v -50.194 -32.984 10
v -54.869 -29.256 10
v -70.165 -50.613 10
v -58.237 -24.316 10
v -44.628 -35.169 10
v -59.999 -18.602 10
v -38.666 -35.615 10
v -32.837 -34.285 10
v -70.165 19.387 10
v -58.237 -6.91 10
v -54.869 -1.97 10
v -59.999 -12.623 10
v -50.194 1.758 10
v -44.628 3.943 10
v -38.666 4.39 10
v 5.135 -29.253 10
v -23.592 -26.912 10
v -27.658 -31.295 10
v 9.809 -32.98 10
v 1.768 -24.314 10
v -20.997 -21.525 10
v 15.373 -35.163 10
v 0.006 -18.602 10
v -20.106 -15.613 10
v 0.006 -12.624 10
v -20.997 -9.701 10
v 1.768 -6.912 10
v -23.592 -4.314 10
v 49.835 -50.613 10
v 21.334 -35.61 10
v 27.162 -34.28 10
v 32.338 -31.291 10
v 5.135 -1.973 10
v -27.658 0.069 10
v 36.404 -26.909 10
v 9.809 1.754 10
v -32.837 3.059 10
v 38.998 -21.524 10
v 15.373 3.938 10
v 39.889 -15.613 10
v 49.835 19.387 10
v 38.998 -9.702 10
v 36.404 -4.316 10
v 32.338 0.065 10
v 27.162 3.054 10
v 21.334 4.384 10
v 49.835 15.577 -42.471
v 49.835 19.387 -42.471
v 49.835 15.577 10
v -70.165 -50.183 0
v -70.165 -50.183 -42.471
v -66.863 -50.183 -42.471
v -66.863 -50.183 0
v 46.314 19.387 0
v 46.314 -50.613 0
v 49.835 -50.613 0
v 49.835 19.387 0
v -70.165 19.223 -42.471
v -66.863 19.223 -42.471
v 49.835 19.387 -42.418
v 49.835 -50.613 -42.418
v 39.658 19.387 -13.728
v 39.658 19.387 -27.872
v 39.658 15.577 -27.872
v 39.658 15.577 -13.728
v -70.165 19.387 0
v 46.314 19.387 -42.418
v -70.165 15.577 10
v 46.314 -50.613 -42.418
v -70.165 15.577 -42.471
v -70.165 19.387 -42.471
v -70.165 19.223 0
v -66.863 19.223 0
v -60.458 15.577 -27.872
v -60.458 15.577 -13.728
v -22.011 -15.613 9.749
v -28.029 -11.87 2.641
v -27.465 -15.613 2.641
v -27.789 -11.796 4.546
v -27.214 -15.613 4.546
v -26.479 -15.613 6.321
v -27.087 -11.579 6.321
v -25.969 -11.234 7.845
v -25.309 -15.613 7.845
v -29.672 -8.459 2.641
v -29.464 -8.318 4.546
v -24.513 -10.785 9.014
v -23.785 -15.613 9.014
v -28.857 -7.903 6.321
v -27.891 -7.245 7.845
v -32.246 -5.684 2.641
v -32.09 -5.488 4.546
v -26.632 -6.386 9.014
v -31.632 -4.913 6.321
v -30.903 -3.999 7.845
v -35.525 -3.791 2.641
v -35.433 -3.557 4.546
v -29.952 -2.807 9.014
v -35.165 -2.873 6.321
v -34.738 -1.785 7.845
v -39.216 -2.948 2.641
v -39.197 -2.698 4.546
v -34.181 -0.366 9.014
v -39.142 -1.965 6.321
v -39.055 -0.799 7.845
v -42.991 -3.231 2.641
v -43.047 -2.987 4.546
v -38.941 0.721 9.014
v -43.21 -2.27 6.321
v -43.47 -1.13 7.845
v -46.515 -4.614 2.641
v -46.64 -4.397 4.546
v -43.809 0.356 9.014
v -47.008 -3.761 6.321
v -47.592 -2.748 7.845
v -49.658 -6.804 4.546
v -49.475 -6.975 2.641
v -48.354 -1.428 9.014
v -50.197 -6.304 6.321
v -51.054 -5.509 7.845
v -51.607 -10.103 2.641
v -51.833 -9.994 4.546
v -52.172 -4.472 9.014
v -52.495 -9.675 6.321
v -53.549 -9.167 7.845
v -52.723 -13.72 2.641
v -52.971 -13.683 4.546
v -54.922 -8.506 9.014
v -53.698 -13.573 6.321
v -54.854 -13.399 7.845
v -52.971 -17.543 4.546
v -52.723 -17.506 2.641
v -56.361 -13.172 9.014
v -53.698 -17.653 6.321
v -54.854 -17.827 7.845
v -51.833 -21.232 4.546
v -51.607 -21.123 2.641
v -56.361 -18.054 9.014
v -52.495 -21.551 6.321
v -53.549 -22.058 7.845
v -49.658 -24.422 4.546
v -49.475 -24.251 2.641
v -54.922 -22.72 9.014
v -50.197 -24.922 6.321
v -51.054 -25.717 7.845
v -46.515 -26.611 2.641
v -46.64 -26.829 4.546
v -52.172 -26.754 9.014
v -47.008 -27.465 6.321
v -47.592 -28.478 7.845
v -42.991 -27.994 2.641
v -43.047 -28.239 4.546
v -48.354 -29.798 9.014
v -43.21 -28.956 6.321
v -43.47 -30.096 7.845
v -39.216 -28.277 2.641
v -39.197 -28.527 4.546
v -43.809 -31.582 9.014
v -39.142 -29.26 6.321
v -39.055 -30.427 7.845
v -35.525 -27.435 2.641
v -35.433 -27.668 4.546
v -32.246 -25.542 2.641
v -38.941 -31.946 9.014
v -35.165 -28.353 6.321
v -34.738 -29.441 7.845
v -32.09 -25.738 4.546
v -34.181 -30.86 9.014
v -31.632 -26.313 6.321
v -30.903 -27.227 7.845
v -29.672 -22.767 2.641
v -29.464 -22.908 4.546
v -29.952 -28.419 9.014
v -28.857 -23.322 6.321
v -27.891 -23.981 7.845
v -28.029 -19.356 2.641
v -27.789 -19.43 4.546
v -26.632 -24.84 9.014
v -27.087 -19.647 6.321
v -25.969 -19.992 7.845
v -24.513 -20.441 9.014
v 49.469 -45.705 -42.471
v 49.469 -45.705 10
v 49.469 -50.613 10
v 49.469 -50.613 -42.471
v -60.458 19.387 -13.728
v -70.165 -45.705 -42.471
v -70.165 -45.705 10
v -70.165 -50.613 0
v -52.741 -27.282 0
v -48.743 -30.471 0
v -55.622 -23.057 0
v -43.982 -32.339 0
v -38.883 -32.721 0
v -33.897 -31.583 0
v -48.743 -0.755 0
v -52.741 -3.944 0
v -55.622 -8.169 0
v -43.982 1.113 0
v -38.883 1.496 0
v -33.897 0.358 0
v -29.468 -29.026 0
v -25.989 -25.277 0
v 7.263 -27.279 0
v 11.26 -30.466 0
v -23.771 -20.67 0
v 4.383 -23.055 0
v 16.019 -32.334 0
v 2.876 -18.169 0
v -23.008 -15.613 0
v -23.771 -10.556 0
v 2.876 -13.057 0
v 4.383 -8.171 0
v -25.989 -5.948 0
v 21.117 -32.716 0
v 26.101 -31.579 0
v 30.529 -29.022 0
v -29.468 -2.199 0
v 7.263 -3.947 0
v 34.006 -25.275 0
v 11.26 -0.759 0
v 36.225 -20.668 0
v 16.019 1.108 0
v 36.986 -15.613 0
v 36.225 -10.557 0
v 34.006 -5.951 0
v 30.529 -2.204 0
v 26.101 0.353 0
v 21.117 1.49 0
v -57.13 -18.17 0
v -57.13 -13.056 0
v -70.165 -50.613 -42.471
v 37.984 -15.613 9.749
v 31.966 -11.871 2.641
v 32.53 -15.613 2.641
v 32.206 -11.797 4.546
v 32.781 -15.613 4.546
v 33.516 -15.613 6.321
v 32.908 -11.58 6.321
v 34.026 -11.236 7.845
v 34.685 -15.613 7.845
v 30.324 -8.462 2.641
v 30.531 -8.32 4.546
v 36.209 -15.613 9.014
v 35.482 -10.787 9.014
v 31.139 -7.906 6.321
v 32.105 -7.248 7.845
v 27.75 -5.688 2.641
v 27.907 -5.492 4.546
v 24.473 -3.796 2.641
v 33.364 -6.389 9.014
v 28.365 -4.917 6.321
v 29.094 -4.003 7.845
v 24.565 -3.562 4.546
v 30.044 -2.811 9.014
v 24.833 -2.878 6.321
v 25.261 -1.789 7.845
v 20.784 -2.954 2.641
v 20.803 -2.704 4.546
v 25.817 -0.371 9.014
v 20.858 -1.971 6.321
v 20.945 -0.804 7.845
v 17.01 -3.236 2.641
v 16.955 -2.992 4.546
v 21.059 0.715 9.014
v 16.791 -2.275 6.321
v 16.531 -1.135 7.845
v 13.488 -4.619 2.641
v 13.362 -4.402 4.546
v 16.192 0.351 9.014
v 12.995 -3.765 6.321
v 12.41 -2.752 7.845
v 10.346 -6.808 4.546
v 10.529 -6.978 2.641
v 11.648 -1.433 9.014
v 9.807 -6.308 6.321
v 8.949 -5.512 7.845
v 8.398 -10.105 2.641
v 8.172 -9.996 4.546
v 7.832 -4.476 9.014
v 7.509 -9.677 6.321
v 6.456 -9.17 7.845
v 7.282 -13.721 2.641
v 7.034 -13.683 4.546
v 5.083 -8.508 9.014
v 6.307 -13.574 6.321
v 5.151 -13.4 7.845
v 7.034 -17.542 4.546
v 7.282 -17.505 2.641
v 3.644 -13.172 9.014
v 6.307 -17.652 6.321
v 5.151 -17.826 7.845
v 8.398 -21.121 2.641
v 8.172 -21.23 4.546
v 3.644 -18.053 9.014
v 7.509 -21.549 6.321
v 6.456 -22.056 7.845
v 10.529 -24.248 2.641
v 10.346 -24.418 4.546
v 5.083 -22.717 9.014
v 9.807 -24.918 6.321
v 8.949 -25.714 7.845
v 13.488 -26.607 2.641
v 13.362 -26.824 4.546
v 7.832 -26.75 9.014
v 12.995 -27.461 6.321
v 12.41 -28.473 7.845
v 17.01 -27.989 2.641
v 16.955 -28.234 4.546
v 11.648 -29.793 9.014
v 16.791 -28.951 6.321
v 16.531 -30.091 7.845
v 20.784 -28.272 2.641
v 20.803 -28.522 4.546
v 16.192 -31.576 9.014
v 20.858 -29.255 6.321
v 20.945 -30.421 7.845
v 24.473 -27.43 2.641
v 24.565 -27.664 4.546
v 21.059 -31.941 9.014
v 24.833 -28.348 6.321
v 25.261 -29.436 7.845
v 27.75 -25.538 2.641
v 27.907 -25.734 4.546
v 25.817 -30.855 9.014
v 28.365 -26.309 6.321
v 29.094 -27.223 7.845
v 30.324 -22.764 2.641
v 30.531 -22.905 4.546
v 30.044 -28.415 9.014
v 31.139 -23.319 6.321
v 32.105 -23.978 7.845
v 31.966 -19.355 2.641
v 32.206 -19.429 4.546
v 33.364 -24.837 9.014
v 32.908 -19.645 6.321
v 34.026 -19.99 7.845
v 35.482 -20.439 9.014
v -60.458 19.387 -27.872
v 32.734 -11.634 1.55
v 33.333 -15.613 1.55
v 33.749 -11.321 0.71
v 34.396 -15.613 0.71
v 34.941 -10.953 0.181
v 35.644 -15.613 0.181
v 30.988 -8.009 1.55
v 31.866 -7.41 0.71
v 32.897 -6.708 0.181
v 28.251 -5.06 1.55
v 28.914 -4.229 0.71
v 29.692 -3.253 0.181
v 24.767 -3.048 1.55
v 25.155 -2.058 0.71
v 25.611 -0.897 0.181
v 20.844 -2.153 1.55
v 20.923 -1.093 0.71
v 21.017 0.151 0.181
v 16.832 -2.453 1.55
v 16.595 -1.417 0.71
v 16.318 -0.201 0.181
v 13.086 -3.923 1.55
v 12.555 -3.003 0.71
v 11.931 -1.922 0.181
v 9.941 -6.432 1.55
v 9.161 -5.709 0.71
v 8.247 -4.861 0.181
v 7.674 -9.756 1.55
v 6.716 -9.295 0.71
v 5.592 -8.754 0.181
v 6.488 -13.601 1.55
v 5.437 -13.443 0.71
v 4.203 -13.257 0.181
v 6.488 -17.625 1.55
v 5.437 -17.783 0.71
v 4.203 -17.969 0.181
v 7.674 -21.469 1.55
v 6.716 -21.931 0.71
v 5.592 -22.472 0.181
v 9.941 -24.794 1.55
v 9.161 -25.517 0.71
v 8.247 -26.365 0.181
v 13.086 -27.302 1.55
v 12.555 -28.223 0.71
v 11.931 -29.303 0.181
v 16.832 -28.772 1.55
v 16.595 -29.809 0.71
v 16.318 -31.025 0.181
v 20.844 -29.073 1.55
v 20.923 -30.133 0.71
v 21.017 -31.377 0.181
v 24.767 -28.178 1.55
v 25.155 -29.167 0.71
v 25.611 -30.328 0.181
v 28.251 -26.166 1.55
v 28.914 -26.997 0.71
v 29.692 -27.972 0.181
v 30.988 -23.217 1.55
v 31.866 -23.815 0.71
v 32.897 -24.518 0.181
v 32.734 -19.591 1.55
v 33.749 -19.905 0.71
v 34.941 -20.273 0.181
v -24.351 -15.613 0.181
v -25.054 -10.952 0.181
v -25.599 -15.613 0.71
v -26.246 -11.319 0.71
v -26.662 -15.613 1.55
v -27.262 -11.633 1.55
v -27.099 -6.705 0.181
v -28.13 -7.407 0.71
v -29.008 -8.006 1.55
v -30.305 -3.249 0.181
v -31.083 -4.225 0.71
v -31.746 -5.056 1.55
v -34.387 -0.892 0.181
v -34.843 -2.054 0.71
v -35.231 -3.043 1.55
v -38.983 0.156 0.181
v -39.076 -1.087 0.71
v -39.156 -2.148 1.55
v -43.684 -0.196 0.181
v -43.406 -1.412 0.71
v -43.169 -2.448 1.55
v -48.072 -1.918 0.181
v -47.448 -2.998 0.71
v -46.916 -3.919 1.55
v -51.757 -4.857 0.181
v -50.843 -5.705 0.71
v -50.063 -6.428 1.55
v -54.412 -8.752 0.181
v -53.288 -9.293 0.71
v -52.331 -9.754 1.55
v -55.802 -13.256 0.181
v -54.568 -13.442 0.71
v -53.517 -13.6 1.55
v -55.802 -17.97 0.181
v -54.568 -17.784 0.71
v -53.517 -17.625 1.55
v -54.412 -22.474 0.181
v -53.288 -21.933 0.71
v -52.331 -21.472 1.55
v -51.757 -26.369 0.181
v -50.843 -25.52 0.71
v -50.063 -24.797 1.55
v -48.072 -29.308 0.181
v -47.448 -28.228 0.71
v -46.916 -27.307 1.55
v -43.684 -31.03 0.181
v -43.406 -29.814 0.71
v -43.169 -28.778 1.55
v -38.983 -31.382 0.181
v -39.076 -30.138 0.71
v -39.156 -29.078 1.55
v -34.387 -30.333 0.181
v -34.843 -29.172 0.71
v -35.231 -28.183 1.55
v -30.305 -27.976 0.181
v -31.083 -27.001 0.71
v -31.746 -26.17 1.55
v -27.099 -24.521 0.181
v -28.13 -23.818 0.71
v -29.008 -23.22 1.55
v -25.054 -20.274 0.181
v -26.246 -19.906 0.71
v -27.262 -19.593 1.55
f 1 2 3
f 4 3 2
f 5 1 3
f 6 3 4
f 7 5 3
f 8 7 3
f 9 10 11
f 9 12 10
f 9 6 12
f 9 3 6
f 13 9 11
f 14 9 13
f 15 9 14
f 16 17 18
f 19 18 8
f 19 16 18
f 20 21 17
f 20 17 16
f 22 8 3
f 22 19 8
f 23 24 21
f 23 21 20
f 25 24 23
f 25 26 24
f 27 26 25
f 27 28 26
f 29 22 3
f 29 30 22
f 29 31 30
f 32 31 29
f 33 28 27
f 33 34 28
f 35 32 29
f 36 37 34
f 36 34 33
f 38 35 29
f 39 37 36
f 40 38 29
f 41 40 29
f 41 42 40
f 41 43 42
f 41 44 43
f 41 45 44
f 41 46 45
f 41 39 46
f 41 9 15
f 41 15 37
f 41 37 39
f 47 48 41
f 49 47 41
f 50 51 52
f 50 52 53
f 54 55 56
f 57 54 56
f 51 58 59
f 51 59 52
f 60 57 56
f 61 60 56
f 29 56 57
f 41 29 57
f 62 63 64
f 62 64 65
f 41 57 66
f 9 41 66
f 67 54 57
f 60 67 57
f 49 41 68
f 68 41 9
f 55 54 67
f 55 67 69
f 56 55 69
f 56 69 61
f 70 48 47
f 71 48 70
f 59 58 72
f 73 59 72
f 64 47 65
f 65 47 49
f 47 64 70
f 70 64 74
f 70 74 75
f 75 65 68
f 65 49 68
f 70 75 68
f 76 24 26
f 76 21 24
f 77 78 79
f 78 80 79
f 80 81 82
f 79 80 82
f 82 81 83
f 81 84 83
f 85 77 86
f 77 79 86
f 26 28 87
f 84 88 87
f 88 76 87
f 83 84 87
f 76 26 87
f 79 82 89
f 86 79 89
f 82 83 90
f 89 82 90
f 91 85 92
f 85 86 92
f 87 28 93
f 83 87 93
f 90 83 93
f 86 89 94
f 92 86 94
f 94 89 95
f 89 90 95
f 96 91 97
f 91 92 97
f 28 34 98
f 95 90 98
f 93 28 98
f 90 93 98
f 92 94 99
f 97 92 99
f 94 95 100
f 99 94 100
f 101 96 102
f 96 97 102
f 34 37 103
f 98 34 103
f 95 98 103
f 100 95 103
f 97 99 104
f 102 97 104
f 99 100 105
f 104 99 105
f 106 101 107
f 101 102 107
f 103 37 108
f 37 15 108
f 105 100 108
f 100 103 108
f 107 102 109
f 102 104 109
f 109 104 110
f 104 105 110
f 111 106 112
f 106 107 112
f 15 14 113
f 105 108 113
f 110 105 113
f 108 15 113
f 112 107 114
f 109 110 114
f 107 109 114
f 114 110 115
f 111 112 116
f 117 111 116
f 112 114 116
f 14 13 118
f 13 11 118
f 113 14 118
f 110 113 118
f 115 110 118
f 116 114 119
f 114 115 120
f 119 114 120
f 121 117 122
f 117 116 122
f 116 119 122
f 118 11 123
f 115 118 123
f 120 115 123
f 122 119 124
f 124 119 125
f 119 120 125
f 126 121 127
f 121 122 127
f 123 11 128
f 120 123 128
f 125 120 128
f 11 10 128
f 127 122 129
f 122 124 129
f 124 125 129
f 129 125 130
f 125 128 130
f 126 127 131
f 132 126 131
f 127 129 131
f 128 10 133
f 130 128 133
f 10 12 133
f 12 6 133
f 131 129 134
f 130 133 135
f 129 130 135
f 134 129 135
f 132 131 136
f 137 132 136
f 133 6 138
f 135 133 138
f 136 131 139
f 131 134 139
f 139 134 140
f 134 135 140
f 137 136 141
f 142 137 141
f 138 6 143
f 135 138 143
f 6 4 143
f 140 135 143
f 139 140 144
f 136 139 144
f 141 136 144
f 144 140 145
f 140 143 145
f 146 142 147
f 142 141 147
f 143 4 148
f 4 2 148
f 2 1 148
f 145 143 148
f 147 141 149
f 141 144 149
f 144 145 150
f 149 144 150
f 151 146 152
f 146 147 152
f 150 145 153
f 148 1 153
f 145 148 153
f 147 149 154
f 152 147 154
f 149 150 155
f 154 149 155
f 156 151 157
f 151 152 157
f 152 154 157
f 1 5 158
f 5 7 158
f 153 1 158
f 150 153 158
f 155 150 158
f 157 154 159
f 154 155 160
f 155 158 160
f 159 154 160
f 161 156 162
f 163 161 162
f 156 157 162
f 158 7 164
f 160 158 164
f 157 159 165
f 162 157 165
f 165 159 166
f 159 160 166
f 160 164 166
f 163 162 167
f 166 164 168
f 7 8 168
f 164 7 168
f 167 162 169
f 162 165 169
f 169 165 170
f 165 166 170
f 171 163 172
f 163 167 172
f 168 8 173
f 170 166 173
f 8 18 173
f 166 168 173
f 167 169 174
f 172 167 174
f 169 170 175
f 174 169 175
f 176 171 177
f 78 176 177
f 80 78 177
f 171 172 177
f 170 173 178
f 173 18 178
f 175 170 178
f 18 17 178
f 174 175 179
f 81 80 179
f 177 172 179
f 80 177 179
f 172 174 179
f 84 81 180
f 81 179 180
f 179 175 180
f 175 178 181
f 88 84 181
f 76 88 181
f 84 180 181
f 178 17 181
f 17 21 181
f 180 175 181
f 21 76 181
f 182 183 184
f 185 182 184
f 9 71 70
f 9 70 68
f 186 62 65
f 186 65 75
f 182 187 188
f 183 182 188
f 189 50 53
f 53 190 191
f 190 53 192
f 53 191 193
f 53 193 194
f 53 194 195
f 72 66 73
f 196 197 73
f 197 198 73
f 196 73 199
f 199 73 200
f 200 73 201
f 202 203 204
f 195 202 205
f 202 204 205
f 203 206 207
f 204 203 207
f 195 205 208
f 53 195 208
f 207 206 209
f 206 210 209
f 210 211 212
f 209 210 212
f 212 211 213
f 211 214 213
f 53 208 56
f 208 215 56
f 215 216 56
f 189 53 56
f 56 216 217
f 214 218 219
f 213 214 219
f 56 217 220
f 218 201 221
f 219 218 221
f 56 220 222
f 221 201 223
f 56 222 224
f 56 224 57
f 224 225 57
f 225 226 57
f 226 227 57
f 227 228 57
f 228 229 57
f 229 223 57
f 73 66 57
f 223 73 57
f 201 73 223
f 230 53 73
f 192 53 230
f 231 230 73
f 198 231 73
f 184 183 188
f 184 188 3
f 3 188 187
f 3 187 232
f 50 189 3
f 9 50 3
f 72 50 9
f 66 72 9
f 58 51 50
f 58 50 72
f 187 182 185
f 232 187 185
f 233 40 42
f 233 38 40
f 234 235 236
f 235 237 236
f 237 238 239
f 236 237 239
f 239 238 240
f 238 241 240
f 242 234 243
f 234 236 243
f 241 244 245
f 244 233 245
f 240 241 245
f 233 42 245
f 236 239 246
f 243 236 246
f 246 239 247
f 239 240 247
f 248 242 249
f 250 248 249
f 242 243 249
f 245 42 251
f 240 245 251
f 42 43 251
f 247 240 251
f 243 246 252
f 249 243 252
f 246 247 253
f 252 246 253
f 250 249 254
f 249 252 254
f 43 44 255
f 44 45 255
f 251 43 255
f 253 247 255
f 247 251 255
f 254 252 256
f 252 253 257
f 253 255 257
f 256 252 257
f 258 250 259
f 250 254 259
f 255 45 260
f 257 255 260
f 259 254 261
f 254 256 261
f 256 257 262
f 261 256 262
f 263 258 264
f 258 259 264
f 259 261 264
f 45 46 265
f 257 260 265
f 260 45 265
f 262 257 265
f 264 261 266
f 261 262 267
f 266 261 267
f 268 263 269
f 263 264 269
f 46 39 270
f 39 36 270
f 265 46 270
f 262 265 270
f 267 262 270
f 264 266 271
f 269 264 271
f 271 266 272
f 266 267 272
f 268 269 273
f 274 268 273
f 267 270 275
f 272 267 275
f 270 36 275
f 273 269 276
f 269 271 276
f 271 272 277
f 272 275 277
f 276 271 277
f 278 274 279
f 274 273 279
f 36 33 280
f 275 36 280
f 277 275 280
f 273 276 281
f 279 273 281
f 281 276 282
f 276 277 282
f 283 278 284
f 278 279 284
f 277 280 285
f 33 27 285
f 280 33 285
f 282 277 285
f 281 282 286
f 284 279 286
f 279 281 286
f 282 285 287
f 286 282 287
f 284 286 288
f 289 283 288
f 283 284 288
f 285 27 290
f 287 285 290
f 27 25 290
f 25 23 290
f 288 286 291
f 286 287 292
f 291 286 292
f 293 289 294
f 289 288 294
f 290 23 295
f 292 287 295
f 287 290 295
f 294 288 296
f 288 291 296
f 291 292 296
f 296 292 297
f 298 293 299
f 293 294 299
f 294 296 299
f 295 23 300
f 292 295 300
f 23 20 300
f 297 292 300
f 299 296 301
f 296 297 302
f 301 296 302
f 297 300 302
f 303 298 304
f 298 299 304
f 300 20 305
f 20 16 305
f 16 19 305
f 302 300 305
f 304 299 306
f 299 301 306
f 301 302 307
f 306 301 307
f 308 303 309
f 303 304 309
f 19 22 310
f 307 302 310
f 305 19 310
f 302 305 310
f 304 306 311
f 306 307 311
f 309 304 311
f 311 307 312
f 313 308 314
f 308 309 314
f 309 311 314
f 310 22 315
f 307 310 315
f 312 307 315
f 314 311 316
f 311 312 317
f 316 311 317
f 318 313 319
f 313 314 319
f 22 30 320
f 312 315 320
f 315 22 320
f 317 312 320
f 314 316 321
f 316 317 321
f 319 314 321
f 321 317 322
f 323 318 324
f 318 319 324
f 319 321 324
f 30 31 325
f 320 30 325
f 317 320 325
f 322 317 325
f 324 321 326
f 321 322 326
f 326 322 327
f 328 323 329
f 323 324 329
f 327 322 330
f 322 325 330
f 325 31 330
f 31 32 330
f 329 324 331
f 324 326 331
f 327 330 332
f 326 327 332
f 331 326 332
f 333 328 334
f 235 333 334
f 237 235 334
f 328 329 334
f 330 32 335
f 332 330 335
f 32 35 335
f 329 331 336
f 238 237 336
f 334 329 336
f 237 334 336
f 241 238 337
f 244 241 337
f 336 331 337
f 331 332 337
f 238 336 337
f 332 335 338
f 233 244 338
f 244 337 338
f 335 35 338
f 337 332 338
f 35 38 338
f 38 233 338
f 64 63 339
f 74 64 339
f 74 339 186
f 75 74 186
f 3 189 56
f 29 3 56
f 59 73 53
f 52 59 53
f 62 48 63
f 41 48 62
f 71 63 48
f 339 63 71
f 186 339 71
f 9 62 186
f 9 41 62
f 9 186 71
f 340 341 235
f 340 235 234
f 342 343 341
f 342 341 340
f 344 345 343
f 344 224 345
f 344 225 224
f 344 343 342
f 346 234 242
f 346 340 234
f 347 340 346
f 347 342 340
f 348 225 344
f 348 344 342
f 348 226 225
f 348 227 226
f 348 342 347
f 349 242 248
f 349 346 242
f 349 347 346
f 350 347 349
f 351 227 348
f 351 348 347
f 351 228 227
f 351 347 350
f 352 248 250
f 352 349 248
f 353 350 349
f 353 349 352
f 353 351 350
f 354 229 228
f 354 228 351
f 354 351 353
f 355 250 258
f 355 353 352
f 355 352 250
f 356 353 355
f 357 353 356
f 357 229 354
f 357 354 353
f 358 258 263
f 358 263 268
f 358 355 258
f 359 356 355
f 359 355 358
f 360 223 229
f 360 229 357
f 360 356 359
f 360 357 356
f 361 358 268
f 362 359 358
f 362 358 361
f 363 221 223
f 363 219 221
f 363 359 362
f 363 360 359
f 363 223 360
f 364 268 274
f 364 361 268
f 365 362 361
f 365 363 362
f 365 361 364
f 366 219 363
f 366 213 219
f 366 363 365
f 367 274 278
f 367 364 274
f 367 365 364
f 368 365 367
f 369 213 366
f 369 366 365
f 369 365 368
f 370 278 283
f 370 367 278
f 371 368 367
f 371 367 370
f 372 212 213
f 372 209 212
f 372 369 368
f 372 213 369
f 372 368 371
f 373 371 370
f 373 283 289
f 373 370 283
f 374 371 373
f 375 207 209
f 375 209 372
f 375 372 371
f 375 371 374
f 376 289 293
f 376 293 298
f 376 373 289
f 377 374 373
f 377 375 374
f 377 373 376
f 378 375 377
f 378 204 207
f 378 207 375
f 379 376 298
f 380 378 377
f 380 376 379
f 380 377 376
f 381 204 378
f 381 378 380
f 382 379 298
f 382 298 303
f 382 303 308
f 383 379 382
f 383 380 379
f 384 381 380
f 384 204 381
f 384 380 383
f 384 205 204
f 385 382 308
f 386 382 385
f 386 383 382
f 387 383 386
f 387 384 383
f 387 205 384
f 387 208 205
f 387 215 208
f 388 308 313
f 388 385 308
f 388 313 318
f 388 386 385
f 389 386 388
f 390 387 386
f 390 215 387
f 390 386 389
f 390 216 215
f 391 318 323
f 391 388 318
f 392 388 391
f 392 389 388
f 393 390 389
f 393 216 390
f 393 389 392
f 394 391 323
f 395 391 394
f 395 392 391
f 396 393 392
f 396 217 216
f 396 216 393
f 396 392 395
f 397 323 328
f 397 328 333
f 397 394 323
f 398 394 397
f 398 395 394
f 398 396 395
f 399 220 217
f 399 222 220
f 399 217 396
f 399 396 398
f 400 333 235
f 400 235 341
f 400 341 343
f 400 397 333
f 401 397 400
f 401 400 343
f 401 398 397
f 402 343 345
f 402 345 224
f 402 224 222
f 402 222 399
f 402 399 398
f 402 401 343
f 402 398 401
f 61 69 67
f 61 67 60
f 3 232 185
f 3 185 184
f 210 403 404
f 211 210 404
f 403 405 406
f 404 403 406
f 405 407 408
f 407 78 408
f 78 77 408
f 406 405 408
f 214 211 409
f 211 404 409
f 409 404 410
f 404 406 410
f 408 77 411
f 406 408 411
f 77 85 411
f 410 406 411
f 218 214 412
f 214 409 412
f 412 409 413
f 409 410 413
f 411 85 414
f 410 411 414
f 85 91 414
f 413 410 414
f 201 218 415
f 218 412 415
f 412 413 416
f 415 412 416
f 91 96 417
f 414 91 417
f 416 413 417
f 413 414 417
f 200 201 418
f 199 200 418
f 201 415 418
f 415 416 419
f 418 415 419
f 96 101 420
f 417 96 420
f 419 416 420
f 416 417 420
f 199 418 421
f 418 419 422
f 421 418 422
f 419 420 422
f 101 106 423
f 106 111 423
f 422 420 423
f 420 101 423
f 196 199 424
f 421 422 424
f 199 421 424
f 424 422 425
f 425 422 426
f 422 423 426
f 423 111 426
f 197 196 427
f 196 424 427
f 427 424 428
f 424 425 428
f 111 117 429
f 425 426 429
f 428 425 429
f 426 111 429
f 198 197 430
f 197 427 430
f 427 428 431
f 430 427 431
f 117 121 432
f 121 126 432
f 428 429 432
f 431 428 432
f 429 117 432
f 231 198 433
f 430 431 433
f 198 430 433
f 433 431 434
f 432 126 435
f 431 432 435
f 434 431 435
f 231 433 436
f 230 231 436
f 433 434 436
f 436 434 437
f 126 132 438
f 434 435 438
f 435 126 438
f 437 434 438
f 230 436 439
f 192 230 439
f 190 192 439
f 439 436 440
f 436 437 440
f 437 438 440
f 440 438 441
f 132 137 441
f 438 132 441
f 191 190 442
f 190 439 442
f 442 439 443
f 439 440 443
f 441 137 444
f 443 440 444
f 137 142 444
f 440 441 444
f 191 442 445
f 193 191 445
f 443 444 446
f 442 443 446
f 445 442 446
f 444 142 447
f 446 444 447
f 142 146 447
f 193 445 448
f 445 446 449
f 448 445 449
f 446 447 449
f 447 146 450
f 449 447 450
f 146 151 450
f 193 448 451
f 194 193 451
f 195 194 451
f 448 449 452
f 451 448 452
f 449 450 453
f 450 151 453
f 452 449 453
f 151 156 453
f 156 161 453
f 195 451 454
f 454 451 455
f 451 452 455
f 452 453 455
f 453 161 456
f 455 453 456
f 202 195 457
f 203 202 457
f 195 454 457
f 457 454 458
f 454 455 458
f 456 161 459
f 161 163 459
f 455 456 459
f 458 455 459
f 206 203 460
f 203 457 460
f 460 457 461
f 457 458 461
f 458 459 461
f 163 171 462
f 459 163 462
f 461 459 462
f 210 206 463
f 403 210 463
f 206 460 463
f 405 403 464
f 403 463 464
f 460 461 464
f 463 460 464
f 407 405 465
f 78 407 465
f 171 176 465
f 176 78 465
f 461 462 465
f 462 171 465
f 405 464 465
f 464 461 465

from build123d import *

# Parameters (mm, degrees)
F0_W      = 60
F0_H      = 70
F0_R      = 12.6947859899
F0_R_2    = 12.7
F1_DEPTH  = 10
F2_R      = 7.3585229381
F4_W      = 69.4058109075
F4_H      = 42.471062392
F5_DEPTH  = 3.302
F6_W      = 120
F6_H      = 52.471062392
F7_DEPTH  = 3.81
F8_W      = 3.5209719837
F8_H      = 70
F9_DEPTH  = 42.418
F10_R     = 2.2359129528
F11_DEPTH = 17.6784
F12_W     = 4.9080215394
F12_H     = 52.471062392
F13_DEPTH = 119.634
F14_W     = 100.1165024936
F14_H     = 14.1438832507
F15_DEPTH = 16.256


# Not quite as in the source:
# - a fillet or chamfer that OpenCascade refuses, or shapes differently, is made with other operations: its cross-section is extruded or revolved along the edge and cut away or added


with BuildPart() as f1:
    # F0 (on Top) → F1 (new body)
    with BuildSketch(Plane.XY):
        with Locations((19.8352524638, -15.612911582)):
            Rectangle(F0_W, F0_H)
        with Locations((19.8352524638, -15.612911582)):
            Circle(F0_R, mode=Mode.SUBTRACT)
        with Locations((-40.1647475362, -15.612911582)):
            Rectangle(F0_W, F0_H)
        with Locations((-40.1647475362, -15.612911582)):
            Circle(F0_R_2, mode=Mode.SUBTRACT)
    extrude(amount=F1_DEPTH)

    # F2
    f2_edges = [f1.edges().sort_by_distance(p)[0] for p in [
        (-52.864748, -15.612912, 10),
        (7.140466, -15.612912, 10),
    ]]
    fillet(f2_edges, radius=F2_R)

    # F3: fillet of radius 5.08 on 2 edges, made by hand

    # F3_s1 → F3_t2 (revolve, cut)
    with BuildSketch(Plane.XZ.offset(15.612911582)):
        with BuildLine():
            ThreePointArc((-23.0082908854, 0), (-25.5985325222, 0.7099830363), (-27.4647475362, 2.6414770619))
            Line((-27.4647475362, 2.6414770619), (-27.4647475362, 0))
            Line((-27.4647475362, 0), (-23.0082908854, 0))
        make_face()
    revolve(axis=Axis((-40.1647475362, -15.612911582, 0), (0, 0, 1)), mode=Mode.SUBTRACT)

    # F3_s3 → F3_t4 (revolve, cut)
    with BuildSketch(Plane.XZ.offset(15.612911582)):
        with BuildLine():
            ThreePointArc((32.5300384537, 2.6414770619), (34.3962534676, 0.7099830363), (36.9864951045, 0))
            Line((36.9864951045, 0), (32.5300384537, 0))
            Line((32.5300384537, 0), (32.5300384537, 2.6414770619))
        make_face()
    revolve(axis=Axis((19.8352524638, -15.612911582, 0), (0, 0, 1)), mode=Mode.SUBTRACT)

    # F4 (on face) → F5 (join)
    with BuildSketch(Plane(origin=(-70.1647475362, 0, 0), x_dir=(0, -1, 0), z_dir=(-1, 0, 0))):
        with Locations((15.4800685123, -21.235531196)):
            Rectangle(F4_W, F4_H)
    extrude(amount=-F5_DEPTH)

    # F10 (on face) → F11 (join)
    with BuildSketch(Plane.XZ.offset(50.612911582)):
        with Locations((-63.7861341238, 5.1306239329)):
            Circle(F10_R)
    extrude(amount=-F11_DEPTH)


with BuildPart() as f7:
    # F6 (on face) → F7 (new body)
    with BuildSketch(Plane(origin=(0, 19.387088418, 0), x_dir=(-1, 0, 0), z_dir=(0, 1, 0))):
        with Locations((10.1647475362, -16.235531196)):
            Rectangle(F6_W, F6_H)
    extrude(amount=-F7_DEPTH)

    # F14 (on face) → F15 (cut)
    with BuildSketch(Plane(origin=(0, 19.387088418, 0), x_dir=(-1, 0, 0), z_dir=(0, 1, 0))):
        with Locations((10.3999134153, -20.7998272963)):
            Rectangle(F14_W, F14_H)
    extrude(amount=-F15_DEPTH, mode=Mode.SUBTRACT)


with BuildPart() as f9:
    # F8 (on face) → F9 (new body)
    with BuildSketch(Plane(origin=(0, 0, 0), x_dir=(1, 0, 0), z_dir=(0, 0, -1))):
        with Locations((48.074766472, 15.612911582)):
            Rectangle(F8_W, F8_H)
    extrude(amount=F9_DEPTH)


with BuildPart() as f13:
    # F12 (on face) → F13 (new body)
    with BuildSketch(Plane(origin=(-70.1647475362, 0, 0), x_dir=(0, -1, 0), z_dir=(-1, 0, 0))):
        with Locations((48.1589008123, -16.235531196)):
            Rectangle(F12_W, F12_H)
    extrude(amount=-F13_DEPTH)


solid = Compound([f1.part, f7.part, f9.part, f13.part])
